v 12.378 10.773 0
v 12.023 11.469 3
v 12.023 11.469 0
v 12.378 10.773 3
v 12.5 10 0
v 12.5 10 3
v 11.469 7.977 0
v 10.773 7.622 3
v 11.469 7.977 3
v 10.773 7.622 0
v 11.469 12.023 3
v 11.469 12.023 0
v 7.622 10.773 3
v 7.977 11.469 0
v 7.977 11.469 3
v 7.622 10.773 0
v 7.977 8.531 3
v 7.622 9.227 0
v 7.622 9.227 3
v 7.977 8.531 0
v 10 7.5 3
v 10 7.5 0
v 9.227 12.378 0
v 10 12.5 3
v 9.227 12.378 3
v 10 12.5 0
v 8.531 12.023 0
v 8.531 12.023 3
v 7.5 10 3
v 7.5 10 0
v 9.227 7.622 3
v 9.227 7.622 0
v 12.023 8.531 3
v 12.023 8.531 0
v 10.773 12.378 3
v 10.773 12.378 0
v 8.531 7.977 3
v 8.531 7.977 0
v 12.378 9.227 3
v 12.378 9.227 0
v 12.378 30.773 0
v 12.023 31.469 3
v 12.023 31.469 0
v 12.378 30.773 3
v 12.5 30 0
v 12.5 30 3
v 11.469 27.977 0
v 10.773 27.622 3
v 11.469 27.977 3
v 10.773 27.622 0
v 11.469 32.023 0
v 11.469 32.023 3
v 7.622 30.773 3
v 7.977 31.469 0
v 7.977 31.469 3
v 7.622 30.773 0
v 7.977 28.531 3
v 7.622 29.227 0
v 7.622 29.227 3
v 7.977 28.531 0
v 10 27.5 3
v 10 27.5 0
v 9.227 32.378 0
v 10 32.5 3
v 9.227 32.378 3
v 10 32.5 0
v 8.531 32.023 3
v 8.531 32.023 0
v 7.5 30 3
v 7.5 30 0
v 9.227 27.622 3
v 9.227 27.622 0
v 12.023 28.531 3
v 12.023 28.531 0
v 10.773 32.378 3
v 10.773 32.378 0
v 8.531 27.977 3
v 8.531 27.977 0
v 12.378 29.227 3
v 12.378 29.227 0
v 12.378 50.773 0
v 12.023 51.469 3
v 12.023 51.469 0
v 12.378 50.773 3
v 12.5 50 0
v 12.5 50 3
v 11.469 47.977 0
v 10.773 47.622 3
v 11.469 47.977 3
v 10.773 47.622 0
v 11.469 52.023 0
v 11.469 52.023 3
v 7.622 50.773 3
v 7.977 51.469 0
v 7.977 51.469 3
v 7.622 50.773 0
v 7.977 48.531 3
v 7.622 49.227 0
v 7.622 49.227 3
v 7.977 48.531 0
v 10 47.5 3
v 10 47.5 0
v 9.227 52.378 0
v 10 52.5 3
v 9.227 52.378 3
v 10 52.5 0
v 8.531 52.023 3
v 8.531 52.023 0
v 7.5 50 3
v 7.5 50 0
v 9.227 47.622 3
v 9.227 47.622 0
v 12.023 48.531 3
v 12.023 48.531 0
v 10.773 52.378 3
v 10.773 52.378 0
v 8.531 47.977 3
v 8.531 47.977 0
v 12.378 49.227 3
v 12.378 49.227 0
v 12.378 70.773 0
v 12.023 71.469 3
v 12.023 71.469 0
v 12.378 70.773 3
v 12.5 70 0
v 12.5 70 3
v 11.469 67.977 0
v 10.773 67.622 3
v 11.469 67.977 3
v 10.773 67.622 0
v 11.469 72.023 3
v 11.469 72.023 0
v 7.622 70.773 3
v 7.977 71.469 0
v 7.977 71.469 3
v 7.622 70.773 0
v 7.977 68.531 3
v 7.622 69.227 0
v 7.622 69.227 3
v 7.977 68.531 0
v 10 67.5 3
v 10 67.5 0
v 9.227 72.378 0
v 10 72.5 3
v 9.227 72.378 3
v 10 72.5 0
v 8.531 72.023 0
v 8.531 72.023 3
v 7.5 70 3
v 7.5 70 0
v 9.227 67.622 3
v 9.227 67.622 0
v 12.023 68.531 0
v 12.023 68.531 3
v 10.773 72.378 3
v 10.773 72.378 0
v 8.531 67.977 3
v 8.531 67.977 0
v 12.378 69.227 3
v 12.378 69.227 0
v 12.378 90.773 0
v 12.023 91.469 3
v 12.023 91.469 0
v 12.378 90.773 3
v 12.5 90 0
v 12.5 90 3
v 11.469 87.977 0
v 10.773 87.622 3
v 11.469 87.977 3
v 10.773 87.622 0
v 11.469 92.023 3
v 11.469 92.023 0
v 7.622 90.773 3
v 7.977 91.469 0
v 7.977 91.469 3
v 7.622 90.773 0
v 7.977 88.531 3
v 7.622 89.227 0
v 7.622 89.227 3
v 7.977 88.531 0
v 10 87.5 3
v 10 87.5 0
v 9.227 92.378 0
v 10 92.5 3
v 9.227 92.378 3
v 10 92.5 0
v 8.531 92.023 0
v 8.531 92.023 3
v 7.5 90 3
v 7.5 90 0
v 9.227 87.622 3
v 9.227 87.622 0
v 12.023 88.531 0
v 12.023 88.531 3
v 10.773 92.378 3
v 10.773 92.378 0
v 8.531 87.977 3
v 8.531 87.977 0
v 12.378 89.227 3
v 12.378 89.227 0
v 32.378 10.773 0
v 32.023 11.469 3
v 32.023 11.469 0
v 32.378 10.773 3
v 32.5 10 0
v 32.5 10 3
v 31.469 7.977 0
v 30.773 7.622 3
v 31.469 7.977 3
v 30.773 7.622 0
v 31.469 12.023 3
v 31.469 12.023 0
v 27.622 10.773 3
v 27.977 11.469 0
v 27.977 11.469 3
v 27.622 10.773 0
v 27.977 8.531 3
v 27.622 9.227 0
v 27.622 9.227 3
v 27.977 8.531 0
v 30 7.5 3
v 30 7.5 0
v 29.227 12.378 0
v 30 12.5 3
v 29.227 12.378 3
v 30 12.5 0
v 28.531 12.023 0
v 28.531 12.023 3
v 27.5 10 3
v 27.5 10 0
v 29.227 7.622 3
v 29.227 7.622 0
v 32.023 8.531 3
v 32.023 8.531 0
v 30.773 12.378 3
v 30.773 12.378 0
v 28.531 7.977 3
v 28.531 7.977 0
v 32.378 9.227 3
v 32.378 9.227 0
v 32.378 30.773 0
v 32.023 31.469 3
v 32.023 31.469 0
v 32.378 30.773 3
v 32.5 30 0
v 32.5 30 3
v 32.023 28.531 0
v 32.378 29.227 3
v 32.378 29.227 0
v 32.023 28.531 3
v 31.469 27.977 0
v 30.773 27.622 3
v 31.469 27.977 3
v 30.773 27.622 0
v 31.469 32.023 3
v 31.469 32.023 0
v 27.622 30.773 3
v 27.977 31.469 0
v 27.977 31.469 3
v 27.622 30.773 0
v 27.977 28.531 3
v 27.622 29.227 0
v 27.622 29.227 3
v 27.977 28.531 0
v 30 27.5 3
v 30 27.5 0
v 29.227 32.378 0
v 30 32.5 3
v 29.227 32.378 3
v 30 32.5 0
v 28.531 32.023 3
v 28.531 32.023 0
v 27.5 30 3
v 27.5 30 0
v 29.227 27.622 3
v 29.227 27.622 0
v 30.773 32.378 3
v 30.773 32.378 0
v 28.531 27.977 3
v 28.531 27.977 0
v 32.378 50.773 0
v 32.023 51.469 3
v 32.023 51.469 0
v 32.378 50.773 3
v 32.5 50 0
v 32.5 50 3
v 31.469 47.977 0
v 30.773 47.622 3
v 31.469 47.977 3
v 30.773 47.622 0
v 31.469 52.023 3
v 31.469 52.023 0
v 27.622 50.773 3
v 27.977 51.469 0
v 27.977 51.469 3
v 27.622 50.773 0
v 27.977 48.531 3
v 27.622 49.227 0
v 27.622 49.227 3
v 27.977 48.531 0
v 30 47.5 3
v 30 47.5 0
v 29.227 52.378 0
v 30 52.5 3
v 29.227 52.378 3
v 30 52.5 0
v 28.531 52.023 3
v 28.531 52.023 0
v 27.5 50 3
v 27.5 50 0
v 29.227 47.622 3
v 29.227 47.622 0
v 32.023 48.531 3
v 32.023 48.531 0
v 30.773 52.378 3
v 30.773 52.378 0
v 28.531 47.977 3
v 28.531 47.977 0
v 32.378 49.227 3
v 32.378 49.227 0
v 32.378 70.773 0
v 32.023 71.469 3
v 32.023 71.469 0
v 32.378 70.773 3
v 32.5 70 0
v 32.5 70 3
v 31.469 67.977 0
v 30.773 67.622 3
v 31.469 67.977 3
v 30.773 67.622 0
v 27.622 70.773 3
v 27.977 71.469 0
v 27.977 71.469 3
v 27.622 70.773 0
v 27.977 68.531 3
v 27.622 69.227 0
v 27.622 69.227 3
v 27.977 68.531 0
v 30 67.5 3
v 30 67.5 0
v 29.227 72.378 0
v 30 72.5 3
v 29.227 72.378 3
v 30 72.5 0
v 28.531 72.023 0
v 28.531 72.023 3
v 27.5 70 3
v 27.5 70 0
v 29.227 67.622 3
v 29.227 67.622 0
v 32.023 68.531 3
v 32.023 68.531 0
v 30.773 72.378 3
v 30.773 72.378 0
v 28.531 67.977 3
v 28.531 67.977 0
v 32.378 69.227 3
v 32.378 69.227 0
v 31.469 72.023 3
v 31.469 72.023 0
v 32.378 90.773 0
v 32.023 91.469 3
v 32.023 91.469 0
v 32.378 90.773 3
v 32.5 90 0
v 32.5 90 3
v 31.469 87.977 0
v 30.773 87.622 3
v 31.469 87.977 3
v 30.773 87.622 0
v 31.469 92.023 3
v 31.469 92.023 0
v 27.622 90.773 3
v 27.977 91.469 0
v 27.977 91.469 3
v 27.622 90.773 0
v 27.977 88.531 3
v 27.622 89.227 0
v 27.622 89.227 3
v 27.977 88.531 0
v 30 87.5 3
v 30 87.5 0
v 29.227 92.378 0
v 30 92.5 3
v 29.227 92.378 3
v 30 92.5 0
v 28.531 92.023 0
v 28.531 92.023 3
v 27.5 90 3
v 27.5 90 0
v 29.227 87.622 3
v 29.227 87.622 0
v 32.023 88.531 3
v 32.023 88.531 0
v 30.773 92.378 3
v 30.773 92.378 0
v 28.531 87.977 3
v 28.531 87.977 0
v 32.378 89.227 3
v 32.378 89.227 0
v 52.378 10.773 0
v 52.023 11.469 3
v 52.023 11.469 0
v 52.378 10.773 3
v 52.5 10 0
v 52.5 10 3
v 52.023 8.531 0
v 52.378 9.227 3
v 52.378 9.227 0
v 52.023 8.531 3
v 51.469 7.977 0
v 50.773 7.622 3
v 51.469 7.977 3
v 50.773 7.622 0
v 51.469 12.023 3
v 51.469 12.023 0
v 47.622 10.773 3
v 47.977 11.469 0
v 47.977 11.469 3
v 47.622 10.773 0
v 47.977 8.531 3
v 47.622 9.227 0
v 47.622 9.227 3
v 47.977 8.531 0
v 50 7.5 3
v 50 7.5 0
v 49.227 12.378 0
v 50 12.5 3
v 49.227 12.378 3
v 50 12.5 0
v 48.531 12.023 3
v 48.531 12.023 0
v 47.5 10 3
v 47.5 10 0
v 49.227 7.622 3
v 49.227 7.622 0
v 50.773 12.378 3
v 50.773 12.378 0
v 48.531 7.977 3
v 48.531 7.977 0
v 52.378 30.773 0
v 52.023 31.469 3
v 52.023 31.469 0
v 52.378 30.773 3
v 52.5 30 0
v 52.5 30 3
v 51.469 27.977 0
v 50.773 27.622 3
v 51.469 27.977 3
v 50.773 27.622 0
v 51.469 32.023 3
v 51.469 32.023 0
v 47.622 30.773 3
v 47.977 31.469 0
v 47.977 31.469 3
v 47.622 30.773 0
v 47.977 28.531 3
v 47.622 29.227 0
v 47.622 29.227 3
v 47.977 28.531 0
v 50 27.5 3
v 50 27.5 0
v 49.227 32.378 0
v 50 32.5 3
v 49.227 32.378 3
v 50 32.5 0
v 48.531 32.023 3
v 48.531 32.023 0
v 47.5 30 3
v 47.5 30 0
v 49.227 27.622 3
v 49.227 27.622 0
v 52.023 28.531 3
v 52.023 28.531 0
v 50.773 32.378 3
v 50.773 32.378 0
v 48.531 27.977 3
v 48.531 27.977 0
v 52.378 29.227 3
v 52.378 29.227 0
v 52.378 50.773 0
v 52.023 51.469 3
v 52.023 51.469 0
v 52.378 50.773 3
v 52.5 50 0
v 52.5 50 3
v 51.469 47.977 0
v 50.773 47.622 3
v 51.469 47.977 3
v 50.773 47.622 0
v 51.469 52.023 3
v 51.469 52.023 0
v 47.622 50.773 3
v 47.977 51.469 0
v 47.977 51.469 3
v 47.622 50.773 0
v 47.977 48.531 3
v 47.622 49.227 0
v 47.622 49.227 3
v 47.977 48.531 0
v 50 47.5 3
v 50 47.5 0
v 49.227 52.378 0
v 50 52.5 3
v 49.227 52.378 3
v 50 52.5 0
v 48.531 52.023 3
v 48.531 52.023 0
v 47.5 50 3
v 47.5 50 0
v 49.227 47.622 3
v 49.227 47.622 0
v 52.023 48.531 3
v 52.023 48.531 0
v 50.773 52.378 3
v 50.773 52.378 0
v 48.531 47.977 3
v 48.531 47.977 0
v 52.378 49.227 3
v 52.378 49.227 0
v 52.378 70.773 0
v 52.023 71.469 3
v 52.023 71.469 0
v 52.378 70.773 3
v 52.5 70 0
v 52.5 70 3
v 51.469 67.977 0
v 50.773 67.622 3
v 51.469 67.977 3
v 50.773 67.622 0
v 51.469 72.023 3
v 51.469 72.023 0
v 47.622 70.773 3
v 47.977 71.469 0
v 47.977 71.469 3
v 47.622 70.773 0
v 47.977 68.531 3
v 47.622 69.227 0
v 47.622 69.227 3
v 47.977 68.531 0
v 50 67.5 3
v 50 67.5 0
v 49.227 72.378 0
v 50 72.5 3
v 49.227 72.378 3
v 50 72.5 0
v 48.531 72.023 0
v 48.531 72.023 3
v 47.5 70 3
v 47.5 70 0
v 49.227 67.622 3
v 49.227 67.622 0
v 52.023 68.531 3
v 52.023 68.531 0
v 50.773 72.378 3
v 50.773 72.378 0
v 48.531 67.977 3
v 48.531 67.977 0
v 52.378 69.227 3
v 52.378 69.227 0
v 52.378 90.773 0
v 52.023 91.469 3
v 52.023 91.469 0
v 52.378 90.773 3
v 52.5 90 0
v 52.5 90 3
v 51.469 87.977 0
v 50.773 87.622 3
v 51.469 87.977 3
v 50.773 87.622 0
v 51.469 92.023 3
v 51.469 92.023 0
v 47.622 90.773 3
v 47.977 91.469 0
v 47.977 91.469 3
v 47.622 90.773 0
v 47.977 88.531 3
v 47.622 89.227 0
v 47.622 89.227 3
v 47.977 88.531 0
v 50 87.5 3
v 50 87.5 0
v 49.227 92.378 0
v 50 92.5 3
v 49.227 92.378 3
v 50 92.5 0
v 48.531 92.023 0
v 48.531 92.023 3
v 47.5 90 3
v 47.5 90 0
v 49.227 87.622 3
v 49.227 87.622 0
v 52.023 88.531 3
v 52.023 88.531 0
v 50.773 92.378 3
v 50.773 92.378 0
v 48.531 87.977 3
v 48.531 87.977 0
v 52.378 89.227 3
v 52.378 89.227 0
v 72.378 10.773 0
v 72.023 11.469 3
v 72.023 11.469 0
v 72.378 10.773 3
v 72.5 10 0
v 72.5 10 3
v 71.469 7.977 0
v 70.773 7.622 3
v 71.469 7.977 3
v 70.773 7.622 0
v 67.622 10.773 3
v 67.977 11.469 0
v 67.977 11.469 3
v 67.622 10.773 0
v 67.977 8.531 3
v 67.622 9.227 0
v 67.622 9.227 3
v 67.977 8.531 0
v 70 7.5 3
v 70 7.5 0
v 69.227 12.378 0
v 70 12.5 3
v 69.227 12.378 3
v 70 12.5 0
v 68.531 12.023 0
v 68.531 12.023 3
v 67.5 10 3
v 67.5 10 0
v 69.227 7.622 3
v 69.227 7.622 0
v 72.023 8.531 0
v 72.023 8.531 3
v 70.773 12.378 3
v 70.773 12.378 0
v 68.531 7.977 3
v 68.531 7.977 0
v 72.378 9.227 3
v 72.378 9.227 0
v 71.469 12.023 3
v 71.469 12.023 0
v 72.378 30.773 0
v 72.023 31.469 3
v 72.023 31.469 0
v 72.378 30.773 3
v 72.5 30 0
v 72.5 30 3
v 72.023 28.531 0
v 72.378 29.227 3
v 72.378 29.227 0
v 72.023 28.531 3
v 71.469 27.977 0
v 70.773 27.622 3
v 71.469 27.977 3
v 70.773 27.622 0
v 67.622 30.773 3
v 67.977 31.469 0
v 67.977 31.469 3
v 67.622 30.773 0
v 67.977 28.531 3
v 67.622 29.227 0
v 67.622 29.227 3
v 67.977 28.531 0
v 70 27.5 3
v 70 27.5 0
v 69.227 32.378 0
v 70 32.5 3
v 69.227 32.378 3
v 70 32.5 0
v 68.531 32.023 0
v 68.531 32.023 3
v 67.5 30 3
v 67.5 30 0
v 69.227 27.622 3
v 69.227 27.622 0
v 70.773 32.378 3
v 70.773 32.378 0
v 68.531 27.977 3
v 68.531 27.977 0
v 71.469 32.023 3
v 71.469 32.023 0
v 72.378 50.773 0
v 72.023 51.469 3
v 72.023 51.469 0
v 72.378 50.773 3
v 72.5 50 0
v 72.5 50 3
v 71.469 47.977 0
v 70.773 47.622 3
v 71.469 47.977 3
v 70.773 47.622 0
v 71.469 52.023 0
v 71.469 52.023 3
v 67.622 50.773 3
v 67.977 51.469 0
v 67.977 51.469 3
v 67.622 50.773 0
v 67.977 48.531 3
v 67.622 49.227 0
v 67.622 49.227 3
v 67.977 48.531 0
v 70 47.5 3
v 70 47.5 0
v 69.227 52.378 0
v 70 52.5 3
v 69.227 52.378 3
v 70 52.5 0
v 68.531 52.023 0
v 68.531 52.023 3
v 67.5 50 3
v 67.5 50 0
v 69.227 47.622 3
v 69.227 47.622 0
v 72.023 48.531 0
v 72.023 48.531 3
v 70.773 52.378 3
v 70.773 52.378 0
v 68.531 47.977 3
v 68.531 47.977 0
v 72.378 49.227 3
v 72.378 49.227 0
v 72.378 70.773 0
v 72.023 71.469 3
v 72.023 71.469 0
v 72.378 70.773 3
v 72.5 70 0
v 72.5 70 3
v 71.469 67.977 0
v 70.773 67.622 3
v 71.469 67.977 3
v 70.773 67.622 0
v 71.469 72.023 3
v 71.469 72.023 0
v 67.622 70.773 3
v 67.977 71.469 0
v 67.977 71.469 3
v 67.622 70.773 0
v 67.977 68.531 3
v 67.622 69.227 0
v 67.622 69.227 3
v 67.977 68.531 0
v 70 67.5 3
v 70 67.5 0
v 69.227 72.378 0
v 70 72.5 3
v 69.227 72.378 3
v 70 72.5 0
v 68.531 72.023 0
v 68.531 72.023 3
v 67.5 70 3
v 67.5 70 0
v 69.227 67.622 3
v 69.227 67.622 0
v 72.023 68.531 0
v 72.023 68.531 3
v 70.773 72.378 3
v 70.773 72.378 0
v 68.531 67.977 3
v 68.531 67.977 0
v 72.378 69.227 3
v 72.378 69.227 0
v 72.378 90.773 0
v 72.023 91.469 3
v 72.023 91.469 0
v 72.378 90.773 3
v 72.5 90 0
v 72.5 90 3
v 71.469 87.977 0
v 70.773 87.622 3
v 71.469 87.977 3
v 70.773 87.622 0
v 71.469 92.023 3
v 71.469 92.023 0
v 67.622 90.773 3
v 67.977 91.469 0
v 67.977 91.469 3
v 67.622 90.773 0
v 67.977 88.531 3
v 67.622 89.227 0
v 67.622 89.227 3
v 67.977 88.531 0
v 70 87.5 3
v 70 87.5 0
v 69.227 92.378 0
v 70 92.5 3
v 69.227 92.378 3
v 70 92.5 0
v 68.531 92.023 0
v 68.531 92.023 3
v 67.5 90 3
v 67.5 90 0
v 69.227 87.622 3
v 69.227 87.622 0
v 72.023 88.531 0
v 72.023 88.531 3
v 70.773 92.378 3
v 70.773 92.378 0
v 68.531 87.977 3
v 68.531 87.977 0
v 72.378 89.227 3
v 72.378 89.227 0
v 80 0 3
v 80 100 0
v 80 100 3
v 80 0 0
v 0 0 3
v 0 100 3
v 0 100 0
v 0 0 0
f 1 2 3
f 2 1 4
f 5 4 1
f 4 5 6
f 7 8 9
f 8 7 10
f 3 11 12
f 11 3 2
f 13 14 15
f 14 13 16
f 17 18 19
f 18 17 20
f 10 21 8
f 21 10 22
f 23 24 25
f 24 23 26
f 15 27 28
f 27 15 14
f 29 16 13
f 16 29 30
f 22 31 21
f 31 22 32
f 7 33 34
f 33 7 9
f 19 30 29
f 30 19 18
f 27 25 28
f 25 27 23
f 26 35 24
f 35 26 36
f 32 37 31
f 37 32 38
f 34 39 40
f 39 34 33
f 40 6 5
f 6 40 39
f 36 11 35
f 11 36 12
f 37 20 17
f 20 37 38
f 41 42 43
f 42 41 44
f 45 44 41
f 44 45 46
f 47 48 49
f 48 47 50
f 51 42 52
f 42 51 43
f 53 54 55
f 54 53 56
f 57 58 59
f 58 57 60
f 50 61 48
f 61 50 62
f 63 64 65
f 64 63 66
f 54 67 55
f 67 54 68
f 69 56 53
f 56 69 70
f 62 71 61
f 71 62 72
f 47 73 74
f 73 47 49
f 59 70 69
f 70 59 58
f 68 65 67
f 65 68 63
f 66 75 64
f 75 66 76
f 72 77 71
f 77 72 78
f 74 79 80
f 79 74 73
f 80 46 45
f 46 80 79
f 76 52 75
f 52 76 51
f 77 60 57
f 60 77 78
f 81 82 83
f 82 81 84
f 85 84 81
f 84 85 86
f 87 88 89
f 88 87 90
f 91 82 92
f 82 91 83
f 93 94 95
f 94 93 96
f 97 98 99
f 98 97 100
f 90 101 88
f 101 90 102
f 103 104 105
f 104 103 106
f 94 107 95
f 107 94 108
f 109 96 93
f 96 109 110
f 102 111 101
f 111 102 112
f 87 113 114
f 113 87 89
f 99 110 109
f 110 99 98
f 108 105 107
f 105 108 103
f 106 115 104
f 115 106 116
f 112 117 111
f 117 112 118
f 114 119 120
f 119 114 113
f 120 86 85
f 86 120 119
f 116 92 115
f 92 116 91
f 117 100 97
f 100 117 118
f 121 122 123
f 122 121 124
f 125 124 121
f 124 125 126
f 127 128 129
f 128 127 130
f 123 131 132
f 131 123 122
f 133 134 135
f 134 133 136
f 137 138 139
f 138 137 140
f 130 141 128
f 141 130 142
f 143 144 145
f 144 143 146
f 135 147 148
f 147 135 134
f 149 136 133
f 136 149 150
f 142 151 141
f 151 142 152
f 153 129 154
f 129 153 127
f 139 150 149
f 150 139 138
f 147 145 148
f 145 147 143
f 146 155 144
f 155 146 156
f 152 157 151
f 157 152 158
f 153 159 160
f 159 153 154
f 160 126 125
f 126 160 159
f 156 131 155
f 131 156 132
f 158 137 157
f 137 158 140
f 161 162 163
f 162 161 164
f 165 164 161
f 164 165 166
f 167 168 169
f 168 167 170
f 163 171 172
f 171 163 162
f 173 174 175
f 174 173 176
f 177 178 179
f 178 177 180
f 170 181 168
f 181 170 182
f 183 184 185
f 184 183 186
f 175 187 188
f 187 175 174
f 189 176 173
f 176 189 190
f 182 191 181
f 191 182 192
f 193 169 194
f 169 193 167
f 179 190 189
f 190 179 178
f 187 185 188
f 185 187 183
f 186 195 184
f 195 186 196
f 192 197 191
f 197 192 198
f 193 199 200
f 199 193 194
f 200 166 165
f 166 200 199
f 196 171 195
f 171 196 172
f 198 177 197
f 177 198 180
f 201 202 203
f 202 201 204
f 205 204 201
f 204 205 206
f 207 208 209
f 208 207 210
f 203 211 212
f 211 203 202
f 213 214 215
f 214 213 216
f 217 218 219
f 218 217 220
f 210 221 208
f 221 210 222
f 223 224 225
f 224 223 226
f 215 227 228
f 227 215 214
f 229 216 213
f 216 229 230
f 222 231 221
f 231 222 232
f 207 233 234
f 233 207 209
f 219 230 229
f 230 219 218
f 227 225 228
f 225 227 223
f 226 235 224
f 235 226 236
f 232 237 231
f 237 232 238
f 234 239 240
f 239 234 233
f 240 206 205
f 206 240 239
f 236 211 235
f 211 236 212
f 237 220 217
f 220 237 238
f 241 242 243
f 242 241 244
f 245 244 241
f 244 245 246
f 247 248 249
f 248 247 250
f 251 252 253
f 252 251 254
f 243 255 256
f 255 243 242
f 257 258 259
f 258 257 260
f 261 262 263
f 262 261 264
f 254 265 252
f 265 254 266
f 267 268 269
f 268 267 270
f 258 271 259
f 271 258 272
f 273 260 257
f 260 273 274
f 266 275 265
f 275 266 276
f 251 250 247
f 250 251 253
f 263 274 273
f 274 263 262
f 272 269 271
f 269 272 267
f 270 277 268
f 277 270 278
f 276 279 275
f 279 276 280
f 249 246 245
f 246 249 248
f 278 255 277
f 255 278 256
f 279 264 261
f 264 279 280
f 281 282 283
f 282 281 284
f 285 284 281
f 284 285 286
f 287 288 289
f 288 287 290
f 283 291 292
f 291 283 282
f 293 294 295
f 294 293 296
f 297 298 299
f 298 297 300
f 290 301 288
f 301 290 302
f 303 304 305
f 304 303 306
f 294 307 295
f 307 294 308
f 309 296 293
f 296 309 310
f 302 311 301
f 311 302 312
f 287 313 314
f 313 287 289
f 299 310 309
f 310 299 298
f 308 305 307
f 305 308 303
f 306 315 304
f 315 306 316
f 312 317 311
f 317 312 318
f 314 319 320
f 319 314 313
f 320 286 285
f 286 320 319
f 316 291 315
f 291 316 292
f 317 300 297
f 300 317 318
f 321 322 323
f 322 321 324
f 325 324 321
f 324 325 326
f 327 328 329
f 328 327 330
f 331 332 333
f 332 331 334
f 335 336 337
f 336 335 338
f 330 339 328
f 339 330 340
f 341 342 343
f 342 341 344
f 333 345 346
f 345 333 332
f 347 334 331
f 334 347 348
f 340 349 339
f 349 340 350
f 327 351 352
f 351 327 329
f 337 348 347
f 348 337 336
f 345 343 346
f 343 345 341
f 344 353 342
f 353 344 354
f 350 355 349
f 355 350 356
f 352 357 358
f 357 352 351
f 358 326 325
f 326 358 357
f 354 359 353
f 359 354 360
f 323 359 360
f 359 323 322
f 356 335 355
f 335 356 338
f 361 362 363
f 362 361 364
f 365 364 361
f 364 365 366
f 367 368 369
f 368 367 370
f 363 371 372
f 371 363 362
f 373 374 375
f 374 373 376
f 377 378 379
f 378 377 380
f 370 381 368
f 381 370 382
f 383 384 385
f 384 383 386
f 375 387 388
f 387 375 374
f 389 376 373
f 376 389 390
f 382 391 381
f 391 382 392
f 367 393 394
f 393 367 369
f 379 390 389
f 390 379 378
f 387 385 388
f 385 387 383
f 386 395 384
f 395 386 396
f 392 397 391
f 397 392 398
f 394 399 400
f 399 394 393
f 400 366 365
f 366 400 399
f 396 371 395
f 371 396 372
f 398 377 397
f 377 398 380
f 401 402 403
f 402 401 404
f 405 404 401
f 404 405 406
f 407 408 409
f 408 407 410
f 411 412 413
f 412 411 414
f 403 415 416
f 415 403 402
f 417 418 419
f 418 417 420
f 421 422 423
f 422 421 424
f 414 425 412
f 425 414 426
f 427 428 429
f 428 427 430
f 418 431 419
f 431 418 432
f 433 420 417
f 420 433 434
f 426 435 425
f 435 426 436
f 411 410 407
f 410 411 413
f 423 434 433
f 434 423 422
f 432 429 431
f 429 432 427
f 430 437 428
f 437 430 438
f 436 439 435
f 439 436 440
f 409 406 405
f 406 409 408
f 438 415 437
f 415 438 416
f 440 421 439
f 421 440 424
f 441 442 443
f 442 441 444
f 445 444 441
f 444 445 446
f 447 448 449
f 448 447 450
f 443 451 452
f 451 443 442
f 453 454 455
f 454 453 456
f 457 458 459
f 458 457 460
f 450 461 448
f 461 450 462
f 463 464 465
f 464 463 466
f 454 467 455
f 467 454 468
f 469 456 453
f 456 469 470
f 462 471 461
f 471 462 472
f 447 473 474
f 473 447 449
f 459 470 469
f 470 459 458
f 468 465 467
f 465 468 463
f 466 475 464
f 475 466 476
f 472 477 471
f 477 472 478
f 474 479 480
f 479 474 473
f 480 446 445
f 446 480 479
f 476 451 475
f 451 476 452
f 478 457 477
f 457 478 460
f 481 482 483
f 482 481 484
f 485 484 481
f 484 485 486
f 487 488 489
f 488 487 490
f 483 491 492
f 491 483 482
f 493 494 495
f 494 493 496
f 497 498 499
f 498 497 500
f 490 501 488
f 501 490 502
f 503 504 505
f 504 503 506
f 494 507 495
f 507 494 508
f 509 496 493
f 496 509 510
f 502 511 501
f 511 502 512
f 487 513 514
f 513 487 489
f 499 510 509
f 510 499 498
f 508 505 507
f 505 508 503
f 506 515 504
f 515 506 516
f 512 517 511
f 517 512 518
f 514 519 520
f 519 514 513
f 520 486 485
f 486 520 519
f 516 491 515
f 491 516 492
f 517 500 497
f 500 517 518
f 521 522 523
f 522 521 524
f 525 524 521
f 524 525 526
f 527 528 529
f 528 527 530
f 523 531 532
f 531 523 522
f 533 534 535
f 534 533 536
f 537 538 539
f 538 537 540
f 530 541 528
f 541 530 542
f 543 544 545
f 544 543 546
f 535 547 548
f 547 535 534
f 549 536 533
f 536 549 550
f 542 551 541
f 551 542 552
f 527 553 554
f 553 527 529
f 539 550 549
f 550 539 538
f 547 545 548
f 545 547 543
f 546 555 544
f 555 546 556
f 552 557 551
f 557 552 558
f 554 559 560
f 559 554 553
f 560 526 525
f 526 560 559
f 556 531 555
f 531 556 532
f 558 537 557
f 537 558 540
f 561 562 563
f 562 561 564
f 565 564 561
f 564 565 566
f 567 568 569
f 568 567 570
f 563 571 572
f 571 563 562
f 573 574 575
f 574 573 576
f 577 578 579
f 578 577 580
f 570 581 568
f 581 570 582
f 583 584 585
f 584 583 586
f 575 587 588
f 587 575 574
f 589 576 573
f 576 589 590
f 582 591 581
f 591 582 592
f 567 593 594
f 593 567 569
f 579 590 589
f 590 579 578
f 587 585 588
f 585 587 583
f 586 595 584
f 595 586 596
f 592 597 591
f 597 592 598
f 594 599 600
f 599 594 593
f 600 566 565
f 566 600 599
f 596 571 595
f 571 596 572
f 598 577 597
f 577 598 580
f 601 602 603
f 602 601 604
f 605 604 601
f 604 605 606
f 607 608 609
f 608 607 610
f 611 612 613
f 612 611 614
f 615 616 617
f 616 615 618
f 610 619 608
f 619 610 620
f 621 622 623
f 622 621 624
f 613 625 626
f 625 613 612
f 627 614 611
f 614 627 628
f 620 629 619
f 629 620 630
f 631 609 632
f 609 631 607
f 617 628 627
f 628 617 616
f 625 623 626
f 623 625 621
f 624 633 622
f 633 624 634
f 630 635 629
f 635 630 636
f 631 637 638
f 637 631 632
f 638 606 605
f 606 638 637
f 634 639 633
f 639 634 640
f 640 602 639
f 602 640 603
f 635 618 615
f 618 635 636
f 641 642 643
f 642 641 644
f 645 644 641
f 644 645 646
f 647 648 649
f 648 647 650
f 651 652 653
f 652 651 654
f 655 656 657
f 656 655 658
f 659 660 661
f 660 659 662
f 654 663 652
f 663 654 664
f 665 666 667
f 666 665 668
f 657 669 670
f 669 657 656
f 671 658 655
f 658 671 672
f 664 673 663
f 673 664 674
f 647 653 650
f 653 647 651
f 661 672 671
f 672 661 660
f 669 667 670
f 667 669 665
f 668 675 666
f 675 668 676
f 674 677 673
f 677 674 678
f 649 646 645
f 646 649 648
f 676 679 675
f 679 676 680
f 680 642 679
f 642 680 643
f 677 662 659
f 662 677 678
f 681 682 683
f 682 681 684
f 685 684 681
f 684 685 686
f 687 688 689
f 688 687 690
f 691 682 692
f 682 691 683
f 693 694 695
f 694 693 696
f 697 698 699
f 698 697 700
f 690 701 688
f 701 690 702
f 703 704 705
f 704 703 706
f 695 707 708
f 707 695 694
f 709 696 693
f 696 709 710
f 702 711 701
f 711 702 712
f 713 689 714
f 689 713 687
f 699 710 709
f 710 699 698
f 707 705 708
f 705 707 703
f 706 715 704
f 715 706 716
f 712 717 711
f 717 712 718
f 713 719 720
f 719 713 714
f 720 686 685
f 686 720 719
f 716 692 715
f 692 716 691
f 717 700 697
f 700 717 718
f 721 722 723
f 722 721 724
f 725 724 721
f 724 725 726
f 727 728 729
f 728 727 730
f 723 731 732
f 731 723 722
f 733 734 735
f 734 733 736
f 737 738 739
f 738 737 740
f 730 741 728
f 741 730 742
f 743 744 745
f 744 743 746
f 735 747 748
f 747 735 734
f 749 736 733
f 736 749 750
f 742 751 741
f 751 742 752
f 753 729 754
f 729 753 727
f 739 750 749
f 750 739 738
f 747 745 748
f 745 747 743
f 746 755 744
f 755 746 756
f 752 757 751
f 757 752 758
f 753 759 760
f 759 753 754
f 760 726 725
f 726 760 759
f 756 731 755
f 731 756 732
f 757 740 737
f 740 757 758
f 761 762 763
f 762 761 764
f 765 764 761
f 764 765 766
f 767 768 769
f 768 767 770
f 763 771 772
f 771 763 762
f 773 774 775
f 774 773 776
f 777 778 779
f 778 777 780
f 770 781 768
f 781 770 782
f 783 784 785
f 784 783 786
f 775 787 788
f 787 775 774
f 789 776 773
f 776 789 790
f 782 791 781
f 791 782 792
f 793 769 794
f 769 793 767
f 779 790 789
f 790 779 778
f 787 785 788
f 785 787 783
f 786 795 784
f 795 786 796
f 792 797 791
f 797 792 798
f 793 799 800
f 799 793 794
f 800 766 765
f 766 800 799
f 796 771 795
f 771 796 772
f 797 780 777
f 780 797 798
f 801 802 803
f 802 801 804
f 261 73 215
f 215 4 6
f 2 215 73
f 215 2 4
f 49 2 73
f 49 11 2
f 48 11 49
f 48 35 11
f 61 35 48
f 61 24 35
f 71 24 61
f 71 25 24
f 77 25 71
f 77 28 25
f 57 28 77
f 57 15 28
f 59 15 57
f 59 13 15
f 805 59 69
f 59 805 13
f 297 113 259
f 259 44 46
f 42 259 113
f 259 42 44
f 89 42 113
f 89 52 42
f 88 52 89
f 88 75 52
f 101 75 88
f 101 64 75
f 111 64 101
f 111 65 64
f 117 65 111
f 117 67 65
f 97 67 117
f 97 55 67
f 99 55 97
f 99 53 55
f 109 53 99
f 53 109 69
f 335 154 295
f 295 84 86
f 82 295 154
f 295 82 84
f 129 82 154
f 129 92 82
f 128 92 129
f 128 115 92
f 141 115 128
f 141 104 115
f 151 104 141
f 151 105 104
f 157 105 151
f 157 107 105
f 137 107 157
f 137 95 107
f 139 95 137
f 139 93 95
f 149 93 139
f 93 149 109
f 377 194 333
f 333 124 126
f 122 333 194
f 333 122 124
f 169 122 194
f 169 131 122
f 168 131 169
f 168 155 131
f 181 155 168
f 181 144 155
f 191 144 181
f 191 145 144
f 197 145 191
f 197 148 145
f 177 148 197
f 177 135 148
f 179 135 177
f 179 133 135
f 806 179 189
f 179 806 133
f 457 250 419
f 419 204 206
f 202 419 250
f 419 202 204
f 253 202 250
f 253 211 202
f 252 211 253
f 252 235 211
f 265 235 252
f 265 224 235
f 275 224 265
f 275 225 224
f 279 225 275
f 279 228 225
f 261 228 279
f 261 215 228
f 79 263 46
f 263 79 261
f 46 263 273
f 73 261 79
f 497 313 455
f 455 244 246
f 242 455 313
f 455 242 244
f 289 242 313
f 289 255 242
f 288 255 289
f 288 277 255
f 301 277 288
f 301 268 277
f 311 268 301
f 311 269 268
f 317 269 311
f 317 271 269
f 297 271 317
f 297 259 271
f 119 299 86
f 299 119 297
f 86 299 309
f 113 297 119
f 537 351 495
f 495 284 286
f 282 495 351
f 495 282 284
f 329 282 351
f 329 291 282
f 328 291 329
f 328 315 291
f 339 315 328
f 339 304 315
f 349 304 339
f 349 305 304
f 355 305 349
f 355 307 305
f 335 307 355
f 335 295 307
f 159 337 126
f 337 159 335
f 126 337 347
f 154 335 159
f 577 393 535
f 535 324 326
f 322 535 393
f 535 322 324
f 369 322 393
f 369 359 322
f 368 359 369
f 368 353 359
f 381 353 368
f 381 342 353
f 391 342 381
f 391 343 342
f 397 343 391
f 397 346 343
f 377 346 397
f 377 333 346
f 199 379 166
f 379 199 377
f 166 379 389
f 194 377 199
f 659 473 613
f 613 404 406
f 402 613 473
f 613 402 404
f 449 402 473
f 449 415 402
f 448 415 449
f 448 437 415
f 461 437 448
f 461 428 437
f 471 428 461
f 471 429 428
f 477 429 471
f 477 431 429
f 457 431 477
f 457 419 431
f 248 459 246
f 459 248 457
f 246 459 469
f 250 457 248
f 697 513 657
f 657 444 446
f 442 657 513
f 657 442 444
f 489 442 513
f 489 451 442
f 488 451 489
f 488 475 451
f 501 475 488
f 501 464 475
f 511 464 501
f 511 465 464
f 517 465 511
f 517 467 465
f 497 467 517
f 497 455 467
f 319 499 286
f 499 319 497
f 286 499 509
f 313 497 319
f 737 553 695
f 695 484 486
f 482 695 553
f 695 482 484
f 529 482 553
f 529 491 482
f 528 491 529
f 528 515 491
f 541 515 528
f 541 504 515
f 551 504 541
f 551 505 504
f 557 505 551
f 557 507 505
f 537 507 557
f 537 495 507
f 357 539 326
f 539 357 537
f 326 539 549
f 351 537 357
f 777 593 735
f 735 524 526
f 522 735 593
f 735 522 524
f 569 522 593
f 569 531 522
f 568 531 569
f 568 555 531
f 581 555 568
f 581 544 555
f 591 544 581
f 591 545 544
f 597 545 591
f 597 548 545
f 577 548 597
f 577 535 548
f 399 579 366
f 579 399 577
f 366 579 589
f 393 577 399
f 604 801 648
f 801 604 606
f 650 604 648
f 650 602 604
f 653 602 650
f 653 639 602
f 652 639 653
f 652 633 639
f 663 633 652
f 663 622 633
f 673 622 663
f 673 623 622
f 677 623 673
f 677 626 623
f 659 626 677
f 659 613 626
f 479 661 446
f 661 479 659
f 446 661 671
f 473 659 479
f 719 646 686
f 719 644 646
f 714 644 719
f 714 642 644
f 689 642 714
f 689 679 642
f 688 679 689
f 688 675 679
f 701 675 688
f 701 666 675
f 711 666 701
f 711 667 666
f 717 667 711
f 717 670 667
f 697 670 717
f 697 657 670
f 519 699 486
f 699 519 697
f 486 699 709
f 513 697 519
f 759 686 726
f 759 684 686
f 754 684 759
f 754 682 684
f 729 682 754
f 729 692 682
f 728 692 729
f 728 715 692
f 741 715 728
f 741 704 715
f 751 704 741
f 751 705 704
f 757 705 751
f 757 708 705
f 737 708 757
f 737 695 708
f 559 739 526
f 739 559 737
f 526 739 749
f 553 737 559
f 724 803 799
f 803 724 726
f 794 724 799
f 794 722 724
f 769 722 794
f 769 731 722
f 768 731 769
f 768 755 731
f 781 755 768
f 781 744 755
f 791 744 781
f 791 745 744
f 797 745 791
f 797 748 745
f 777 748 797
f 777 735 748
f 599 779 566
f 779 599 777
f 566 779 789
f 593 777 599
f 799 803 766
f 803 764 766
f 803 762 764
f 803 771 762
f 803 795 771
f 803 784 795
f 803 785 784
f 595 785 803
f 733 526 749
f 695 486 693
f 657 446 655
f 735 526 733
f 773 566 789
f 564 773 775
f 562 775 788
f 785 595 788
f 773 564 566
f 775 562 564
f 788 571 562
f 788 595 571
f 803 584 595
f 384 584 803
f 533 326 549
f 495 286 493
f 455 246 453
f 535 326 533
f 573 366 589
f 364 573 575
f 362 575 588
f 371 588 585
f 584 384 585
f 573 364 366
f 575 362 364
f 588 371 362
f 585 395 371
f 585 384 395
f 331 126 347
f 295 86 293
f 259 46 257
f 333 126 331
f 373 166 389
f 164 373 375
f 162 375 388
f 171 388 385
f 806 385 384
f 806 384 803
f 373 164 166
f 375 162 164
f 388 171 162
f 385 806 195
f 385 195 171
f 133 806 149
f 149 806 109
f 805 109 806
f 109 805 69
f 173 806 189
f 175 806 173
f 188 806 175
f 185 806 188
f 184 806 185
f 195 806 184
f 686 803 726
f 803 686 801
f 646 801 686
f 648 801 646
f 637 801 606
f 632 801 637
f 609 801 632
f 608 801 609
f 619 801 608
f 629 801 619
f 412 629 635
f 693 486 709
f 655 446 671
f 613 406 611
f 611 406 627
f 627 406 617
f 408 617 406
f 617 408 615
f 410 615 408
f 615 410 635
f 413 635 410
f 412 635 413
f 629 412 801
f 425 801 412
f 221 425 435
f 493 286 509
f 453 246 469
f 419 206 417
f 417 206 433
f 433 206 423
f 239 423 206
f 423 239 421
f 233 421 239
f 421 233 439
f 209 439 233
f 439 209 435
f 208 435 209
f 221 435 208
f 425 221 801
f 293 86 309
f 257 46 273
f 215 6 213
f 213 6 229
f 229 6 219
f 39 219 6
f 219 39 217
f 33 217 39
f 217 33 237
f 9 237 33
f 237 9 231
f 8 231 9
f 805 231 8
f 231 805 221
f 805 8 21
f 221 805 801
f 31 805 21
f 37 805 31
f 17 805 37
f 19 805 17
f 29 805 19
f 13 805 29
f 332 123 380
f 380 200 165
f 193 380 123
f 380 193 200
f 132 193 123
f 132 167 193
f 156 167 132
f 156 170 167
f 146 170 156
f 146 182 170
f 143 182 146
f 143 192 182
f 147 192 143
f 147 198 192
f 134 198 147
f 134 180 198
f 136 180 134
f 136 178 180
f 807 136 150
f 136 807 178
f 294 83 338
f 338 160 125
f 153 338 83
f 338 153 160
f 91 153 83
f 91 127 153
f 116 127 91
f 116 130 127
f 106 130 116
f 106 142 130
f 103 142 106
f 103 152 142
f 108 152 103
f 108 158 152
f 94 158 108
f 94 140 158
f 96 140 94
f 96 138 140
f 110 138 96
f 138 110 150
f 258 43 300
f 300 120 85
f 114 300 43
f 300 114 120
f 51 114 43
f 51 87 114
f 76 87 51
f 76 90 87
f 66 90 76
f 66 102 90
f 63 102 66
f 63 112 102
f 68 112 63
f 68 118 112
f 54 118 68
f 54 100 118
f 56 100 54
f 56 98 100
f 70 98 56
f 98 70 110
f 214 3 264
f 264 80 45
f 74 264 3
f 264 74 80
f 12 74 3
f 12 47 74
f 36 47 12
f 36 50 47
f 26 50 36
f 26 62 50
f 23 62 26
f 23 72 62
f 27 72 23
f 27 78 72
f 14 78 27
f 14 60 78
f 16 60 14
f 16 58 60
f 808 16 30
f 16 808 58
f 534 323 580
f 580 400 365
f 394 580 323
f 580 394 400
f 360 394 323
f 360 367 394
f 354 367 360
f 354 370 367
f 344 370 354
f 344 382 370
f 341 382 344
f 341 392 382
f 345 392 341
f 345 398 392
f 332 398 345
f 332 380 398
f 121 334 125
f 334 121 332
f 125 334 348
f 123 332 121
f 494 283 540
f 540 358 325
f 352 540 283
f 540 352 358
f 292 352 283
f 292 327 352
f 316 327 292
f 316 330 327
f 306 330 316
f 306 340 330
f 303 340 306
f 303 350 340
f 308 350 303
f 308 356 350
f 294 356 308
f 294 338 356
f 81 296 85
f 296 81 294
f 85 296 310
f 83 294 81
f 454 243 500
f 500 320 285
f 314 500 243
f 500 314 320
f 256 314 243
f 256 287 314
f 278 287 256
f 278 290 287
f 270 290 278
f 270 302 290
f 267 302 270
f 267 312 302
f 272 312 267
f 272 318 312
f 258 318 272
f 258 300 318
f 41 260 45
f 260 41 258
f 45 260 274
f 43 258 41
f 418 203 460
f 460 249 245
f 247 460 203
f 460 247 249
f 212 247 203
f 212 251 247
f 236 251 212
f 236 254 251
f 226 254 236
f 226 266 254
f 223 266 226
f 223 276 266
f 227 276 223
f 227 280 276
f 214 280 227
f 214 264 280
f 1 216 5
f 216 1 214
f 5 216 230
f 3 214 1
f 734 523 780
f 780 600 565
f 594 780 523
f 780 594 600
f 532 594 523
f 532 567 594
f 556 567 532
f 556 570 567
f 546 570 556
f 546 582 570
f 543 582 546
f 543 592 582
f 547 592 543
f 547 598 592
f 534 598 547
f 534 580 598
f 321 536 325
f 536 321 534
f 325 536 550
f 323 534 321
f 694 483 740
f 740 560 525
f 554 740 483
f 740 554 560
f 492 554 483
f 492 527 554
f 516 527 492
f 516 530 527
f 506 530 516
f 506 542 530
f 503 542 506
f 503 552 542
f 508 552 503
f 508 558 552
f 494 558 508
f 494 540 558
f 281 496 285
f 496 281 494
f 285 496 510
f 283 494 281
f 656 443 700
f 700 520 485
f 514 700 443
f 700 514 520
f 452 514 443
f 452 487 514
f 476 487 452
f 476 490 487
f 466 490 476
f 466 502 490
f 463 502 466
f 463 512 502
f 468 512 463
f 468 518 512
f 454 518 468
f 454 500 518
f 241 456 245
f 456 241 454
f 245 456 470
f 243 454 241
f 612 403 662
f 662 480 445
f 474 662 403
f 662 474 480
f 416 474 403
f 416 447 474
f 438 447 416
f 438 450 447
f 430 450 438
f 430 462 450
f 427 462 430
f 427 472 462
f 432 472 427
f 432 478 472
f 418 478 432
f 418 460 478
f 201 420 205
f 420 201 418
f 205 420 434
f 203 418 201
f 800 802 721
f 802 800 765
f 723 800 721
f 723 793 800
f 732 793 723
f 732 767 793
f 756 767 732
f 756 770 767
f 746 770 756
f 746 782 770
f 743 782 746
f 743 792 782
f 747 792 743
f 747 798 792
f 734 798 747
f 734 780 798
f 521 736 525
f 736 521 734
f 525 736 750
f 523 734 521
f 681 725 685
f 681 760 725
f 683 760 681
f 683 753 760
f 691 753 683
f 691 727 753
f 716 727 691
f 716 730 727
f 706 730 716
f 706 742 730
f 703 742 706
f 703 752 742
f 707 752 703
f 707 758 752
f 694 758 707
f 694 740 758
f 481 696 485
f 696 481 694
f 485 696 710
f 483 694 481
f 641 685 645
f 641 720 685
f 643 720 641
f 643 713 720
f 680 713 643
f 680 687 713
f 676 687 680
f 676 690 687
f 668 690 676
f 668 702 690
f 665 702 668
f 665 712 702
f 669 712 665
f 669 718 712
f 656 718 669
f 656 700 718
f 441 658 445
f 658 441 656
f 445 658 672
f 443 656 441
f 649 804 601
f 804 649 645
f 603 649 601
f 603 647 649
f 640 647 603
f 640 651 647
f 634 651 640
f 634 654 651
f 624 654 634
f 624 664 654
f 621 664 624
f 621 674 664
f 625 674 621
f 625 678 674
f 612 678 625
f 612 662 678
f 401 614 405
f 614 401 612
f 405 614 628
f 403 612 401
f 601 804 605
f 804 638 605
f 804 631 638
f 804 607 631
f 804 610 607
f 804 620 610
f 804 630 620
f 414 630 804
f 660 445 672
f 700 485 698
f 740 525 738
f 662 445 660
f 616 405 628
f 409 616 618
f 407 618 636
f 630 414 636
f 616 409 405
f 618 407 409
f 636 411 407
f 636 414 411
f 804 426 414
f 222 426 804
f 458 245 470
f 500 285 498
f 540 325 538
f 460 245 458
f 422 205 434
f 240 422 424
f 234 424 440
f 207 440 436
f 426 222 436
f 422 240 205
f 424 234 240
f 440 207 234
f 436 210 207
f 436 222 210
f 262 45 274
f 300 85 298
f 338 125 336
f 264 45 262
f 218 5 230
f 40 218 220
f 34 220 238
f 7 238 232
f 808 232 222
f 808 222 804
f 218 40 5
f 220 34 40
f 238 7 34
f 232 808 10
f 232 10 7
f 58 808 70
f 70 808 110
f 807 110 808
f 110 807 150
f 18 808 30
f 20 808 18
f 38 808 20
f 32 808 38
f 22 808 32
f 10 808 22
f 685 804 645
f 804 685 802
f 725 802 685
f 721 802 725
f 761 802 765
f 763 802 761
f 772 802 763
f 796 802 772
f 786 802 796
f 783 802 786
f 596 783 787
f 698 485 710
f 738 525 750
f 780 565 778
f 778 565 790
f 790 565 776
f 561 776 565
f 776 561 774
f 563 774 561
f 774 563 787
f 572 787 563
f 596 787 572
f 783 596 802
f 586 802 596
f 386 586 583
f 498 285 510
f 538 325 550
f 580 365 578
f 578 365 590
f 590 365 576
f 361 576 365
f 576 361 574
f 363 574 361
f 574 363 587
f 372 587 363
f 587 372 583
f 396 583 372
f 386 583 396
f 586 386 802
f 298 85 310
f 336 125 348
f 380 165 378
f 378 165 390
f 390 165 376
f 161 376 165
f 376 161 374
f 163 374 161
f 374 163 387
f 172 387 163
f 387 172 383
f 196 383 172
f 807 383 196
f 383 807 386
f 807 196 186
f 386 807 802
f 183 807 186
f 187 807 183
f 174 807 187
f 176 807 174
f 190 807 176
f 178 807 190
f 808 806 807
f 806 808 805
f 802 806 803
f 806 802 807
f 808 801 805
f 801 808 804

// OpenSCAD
//4X5JP

//variables
xBase = 80;
yBase = 100;
zBase = 3;

dHoles = 5;
xDiff = 7.5 + dHoles/2;
yDiff = 7.5 + dHoles/2;

xDiffBet = 15 + dHoles;
yDiffBet = 15+ dHoles;

//modules
module body(){
    difference(){
        base();
        translate([-xDiffBet+xDiff,-yDiffBet+yDiff,0])
            holes();
    }
}

module base(){
    cube([xBase,yBase,zBase]);
}


module holes(){
    for(j= [1:4]){
        for (i = [1 : 5]) {
            #translate([xDiffBet*j,yDiffBet*i,0])
                cylinder(h= zBase*3, d = dHoles, center = true, $fn=20);
        }
    }
}

body();
